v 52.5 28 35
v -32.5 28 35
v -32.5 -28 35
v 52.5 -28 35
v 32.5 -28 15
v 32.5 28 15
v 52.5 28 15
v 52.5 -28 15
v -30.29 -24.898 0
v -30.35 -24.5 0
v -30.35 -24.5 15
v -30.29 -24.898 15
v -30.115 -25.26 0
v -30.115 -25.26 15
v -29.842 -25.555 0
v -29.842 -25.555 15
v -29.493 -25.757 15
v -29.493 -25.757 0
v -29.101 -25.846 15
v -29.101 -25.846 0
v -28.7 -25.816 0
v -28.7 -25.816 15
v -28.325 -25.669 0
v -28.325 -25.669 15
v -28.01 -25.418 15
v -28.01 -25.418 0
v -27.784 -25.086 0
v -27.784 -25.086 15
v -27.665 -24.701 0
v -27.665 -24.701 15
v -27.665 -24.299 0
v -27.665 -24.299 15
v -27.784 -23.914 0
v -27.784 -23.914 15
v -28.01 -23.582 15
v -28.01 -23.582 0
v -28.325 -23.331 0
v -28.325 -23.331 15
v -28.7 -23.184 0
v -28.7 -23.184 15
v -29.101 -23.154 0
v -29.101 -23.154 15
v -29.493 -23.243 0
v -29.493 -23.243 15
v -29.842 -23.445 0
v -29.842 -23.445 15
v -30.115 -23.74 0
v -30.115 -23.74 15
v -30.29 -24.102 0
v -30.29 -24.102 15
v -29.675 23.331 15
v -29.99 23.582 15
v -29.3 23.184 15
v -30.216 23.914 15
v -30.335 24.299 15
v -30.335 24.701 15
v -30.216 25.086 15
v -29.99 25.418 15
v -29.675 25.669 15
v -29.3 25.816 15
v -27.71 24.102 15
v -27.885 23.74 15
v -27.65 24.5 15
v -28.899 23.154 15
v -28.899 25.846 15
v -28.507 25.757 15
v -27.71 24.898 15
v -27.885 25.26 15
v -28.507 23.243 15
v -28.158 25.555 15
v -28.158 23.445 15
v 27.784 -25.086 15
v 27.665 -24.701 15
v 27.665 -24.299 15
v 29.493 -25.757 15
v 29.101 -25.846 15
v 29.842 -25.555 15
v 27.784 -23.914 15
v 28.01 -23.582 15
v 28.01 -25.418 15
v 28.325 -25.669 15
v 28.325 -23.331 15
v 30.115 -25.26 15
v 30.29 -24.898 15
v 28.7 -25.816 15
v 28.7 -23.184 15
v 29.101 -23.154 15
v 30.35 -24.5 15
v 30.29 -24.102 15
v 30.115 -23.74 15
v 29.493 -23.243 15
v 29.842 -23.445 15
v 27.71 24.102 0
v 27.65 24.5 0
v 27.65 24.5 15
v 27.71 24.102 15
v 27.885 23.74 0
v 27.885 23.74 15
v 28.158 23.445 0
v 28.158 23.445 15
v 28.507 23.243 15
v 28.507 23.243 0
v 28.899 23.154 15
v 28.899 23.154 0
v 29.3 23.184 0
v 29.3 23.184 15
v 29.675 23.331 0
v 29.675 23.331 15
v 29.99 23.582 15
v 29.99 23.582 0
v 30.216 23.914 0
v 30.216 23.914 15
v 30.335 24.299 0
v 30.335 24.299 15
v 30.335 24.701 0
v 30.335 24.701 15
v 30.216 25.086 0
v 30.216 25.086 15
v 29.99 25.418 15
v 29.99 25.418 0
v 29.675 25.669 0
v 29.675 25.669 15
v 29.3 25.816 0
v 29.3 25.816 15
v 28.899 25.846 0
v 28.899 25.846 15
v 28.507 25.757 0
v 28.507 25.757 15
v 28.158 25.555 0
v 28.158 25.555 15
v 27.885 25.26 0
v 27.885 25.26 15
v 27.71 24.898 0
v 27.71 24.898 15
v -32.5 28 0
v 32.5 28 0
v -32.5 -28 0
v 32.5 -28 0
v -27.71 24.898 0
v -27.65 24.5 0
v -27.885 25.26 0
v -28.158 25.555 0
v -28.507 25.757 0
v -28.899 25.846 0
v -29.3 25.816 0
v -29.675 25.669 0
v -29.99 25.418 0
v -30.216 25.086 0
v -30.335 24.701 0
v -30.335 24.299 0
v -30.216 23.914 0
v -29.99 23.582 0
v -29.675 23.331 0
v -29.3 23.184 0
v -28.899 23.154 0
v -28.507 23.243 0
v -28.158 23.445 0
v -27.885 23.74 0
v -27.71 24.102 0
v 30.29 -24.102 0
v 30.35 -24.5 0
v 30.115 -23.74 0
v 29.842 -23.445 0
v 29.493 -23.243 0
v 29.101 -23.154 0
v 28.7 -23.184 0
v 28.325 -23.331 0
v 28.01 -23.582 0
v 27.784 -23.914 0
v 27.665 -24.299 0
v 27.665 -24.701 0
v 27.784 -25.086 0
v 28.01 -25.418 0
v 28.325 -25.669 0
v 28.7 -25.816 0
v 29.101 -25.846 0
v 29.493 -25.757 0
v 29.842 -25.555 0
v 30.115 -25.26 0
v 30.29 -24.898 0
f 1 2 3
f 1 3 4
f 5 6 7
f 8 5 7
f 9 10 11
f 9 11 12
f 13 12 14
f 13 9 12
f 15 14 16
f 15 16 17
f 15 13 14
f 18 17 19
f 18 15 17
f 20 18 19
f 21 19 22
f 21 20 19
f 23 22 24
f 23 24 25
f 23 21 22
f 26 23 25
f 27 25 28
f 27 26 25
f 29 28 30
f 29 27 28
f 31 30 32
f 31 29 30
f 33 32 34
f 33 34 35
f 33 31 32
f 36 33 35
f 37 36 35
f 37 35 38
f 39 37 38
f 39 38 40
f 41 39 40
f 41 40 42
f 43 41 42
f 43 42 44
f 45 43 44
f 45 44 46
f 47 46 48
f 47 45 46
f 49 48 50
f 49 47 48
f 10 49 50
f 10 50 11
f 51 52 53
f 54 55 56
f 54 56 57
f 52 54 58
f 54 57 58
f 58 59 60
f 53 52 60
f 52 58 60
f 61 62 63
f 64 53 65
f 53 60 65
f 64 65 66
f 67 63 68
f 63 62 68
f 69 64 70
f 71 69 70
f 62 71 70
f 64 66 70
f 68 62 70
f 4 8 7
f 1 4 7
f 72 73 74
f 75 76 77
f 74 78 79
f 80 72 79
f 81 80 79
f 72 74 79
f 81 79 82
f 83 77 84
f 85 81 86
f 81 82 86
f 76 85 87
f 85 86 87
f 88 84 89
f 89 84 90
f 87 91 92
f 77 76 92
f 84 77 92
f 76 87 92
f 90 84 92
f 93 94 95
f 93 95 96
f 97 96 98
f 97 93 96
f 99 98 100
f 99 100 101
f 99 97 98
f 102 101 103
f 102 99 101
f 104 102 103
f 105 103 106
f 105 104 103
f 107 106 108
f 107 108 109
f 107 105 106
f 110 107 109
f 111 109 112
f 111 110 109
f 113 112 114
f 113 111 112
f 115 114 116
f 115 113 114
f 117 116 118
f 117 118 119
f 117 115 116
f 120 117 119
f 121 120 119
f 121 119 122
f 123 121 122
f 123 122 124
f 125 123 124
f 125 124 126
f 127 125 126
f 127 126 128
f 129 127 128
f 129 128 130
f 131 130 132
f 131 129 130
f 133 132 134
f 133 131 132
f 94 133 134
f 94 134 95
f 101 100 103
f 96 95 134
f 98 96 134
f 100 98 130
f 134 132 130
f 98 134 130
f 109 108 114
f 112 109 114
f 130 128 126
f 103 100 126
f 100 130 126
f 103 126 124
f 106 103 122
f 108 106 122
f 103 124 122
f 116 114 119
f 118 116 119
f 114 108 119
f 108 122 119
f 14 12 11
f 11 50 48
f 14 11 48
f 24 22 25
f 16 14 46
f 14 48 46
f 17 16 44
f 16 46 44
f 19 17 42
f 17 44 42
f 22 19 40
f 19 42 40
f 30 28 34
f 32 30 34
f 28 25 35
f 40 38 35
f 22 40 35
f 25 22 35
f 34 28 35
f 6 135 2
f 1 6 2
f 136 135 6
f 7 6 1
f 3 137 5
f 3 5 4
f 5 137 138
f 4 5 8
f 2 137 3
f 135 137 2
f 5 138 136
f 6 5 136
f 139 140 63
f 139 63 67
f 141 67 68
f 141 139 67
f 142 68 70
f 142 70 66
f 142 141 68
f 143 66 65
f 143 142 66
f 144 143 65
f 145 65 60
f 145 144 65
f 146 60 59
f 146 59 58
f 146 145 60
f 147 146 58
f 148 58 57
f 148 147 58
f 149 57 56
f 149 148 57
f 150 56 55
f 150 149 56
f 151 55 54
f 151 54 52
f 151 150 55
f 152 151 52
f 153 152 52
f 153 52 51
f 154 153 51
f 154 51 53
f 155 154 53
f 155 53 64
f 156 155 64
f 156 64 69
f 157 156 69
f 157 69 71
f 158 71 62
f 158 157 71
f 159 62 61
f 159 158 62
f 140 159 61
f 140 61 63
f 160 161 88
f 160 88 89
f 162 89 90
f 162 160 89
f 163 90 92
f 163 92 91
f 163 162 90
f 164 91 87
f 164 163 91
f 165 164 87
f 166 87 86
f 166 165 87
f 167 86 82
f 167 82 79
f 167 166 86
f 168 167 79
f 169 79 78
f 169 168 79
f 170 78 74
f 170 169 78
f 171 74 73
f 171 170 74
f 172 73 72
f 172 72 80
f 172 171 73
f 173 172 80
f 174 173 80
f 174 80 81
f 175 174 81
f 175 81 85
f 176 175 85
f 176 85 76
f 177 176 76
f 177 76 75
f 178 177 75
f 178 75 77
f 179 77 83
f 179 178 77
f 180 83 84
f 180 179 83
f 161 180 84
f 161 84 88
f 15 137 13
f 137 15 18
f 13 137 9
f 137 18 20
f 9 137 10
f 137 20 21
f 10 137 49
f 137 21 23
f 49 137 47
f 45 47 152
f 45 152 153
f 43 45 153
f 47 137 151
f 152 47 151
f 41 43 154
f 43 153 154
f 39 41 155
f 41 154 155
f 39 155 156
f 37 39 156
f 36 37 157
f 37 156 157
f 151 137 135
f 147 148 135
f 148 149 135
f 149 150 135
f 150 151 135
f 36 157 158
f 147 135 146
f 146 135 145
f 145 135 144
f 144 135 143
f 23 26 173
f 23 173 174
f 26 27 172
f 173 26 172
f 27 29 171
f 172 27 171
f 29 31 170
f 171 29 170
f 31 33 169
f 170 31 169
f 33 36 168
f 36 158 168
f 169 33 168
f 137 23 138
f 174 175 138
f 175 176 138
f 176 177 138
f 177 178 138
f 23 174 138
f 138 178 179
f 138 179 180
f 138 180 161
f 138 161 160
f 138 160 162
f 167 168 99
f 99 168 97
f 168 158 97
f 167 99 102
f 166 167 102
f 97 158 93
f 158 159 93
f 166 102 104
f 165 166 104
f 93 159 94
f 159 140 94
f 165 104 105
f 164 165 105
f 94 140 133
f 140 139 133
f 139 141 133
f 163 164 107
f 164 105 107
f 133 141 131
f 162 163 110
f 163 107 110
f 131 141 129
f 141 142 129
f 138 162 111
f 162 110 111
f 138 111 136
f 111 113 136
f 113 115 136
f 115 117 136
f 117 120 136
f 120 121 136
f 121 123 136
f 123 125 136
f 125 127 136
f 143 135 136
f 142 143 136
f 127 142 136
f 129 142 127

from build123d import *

# Parameters (mm, degrees)
SKETCH_1_W      = 65
SKETCH_1_H      = 56
SKETCH_1_R      = 1.35
EXTRUDE_1_DEPTH = 15
SKETCH_2_W      = 85
SKETCH_2_H      = 56
EXTRUDE_2_DEPTH = 20


with BuildPart() as part:
    # 草图1 → 凸台-拉伸1 (new body)
    with BuildSketch(Plane.XY):
        Rectangle(SKETCH_1_W, SKETCH_1_H)
        with Locations((-29, 24.5)):
            Circle(SKETCH_1_R, mode=Mode.SUBTRACT)
        with Locations(Location((29, 24.5, 0), (0, 0, 180))):
            Circle(SKETCH_1_R, mode=Mode.SUBTRACT)
        with Locations(Location((-29, -24.5, 0), (0, 0, 180))):
            Circle(SKETCH_1_R, mode=Mode.SUBTRACT)
        with Locations((29, -24.5)):
            Circle(SKETCH_1_R, mode=Mode.SUBTRACT)
    extrude(amount=EXTRUDE_1_DEPTH)

    # 草图2 → 凸台-拉伸2 (add)
    with BuildSketch(Plane.XY.offset(15)):
        with Locations((10, 0)):
            Rectangle(SKETCH_2_W, SKETCH_2_H)
    extrude(amount=EXTRUDE_2_DEPTH)


solid = part.part
